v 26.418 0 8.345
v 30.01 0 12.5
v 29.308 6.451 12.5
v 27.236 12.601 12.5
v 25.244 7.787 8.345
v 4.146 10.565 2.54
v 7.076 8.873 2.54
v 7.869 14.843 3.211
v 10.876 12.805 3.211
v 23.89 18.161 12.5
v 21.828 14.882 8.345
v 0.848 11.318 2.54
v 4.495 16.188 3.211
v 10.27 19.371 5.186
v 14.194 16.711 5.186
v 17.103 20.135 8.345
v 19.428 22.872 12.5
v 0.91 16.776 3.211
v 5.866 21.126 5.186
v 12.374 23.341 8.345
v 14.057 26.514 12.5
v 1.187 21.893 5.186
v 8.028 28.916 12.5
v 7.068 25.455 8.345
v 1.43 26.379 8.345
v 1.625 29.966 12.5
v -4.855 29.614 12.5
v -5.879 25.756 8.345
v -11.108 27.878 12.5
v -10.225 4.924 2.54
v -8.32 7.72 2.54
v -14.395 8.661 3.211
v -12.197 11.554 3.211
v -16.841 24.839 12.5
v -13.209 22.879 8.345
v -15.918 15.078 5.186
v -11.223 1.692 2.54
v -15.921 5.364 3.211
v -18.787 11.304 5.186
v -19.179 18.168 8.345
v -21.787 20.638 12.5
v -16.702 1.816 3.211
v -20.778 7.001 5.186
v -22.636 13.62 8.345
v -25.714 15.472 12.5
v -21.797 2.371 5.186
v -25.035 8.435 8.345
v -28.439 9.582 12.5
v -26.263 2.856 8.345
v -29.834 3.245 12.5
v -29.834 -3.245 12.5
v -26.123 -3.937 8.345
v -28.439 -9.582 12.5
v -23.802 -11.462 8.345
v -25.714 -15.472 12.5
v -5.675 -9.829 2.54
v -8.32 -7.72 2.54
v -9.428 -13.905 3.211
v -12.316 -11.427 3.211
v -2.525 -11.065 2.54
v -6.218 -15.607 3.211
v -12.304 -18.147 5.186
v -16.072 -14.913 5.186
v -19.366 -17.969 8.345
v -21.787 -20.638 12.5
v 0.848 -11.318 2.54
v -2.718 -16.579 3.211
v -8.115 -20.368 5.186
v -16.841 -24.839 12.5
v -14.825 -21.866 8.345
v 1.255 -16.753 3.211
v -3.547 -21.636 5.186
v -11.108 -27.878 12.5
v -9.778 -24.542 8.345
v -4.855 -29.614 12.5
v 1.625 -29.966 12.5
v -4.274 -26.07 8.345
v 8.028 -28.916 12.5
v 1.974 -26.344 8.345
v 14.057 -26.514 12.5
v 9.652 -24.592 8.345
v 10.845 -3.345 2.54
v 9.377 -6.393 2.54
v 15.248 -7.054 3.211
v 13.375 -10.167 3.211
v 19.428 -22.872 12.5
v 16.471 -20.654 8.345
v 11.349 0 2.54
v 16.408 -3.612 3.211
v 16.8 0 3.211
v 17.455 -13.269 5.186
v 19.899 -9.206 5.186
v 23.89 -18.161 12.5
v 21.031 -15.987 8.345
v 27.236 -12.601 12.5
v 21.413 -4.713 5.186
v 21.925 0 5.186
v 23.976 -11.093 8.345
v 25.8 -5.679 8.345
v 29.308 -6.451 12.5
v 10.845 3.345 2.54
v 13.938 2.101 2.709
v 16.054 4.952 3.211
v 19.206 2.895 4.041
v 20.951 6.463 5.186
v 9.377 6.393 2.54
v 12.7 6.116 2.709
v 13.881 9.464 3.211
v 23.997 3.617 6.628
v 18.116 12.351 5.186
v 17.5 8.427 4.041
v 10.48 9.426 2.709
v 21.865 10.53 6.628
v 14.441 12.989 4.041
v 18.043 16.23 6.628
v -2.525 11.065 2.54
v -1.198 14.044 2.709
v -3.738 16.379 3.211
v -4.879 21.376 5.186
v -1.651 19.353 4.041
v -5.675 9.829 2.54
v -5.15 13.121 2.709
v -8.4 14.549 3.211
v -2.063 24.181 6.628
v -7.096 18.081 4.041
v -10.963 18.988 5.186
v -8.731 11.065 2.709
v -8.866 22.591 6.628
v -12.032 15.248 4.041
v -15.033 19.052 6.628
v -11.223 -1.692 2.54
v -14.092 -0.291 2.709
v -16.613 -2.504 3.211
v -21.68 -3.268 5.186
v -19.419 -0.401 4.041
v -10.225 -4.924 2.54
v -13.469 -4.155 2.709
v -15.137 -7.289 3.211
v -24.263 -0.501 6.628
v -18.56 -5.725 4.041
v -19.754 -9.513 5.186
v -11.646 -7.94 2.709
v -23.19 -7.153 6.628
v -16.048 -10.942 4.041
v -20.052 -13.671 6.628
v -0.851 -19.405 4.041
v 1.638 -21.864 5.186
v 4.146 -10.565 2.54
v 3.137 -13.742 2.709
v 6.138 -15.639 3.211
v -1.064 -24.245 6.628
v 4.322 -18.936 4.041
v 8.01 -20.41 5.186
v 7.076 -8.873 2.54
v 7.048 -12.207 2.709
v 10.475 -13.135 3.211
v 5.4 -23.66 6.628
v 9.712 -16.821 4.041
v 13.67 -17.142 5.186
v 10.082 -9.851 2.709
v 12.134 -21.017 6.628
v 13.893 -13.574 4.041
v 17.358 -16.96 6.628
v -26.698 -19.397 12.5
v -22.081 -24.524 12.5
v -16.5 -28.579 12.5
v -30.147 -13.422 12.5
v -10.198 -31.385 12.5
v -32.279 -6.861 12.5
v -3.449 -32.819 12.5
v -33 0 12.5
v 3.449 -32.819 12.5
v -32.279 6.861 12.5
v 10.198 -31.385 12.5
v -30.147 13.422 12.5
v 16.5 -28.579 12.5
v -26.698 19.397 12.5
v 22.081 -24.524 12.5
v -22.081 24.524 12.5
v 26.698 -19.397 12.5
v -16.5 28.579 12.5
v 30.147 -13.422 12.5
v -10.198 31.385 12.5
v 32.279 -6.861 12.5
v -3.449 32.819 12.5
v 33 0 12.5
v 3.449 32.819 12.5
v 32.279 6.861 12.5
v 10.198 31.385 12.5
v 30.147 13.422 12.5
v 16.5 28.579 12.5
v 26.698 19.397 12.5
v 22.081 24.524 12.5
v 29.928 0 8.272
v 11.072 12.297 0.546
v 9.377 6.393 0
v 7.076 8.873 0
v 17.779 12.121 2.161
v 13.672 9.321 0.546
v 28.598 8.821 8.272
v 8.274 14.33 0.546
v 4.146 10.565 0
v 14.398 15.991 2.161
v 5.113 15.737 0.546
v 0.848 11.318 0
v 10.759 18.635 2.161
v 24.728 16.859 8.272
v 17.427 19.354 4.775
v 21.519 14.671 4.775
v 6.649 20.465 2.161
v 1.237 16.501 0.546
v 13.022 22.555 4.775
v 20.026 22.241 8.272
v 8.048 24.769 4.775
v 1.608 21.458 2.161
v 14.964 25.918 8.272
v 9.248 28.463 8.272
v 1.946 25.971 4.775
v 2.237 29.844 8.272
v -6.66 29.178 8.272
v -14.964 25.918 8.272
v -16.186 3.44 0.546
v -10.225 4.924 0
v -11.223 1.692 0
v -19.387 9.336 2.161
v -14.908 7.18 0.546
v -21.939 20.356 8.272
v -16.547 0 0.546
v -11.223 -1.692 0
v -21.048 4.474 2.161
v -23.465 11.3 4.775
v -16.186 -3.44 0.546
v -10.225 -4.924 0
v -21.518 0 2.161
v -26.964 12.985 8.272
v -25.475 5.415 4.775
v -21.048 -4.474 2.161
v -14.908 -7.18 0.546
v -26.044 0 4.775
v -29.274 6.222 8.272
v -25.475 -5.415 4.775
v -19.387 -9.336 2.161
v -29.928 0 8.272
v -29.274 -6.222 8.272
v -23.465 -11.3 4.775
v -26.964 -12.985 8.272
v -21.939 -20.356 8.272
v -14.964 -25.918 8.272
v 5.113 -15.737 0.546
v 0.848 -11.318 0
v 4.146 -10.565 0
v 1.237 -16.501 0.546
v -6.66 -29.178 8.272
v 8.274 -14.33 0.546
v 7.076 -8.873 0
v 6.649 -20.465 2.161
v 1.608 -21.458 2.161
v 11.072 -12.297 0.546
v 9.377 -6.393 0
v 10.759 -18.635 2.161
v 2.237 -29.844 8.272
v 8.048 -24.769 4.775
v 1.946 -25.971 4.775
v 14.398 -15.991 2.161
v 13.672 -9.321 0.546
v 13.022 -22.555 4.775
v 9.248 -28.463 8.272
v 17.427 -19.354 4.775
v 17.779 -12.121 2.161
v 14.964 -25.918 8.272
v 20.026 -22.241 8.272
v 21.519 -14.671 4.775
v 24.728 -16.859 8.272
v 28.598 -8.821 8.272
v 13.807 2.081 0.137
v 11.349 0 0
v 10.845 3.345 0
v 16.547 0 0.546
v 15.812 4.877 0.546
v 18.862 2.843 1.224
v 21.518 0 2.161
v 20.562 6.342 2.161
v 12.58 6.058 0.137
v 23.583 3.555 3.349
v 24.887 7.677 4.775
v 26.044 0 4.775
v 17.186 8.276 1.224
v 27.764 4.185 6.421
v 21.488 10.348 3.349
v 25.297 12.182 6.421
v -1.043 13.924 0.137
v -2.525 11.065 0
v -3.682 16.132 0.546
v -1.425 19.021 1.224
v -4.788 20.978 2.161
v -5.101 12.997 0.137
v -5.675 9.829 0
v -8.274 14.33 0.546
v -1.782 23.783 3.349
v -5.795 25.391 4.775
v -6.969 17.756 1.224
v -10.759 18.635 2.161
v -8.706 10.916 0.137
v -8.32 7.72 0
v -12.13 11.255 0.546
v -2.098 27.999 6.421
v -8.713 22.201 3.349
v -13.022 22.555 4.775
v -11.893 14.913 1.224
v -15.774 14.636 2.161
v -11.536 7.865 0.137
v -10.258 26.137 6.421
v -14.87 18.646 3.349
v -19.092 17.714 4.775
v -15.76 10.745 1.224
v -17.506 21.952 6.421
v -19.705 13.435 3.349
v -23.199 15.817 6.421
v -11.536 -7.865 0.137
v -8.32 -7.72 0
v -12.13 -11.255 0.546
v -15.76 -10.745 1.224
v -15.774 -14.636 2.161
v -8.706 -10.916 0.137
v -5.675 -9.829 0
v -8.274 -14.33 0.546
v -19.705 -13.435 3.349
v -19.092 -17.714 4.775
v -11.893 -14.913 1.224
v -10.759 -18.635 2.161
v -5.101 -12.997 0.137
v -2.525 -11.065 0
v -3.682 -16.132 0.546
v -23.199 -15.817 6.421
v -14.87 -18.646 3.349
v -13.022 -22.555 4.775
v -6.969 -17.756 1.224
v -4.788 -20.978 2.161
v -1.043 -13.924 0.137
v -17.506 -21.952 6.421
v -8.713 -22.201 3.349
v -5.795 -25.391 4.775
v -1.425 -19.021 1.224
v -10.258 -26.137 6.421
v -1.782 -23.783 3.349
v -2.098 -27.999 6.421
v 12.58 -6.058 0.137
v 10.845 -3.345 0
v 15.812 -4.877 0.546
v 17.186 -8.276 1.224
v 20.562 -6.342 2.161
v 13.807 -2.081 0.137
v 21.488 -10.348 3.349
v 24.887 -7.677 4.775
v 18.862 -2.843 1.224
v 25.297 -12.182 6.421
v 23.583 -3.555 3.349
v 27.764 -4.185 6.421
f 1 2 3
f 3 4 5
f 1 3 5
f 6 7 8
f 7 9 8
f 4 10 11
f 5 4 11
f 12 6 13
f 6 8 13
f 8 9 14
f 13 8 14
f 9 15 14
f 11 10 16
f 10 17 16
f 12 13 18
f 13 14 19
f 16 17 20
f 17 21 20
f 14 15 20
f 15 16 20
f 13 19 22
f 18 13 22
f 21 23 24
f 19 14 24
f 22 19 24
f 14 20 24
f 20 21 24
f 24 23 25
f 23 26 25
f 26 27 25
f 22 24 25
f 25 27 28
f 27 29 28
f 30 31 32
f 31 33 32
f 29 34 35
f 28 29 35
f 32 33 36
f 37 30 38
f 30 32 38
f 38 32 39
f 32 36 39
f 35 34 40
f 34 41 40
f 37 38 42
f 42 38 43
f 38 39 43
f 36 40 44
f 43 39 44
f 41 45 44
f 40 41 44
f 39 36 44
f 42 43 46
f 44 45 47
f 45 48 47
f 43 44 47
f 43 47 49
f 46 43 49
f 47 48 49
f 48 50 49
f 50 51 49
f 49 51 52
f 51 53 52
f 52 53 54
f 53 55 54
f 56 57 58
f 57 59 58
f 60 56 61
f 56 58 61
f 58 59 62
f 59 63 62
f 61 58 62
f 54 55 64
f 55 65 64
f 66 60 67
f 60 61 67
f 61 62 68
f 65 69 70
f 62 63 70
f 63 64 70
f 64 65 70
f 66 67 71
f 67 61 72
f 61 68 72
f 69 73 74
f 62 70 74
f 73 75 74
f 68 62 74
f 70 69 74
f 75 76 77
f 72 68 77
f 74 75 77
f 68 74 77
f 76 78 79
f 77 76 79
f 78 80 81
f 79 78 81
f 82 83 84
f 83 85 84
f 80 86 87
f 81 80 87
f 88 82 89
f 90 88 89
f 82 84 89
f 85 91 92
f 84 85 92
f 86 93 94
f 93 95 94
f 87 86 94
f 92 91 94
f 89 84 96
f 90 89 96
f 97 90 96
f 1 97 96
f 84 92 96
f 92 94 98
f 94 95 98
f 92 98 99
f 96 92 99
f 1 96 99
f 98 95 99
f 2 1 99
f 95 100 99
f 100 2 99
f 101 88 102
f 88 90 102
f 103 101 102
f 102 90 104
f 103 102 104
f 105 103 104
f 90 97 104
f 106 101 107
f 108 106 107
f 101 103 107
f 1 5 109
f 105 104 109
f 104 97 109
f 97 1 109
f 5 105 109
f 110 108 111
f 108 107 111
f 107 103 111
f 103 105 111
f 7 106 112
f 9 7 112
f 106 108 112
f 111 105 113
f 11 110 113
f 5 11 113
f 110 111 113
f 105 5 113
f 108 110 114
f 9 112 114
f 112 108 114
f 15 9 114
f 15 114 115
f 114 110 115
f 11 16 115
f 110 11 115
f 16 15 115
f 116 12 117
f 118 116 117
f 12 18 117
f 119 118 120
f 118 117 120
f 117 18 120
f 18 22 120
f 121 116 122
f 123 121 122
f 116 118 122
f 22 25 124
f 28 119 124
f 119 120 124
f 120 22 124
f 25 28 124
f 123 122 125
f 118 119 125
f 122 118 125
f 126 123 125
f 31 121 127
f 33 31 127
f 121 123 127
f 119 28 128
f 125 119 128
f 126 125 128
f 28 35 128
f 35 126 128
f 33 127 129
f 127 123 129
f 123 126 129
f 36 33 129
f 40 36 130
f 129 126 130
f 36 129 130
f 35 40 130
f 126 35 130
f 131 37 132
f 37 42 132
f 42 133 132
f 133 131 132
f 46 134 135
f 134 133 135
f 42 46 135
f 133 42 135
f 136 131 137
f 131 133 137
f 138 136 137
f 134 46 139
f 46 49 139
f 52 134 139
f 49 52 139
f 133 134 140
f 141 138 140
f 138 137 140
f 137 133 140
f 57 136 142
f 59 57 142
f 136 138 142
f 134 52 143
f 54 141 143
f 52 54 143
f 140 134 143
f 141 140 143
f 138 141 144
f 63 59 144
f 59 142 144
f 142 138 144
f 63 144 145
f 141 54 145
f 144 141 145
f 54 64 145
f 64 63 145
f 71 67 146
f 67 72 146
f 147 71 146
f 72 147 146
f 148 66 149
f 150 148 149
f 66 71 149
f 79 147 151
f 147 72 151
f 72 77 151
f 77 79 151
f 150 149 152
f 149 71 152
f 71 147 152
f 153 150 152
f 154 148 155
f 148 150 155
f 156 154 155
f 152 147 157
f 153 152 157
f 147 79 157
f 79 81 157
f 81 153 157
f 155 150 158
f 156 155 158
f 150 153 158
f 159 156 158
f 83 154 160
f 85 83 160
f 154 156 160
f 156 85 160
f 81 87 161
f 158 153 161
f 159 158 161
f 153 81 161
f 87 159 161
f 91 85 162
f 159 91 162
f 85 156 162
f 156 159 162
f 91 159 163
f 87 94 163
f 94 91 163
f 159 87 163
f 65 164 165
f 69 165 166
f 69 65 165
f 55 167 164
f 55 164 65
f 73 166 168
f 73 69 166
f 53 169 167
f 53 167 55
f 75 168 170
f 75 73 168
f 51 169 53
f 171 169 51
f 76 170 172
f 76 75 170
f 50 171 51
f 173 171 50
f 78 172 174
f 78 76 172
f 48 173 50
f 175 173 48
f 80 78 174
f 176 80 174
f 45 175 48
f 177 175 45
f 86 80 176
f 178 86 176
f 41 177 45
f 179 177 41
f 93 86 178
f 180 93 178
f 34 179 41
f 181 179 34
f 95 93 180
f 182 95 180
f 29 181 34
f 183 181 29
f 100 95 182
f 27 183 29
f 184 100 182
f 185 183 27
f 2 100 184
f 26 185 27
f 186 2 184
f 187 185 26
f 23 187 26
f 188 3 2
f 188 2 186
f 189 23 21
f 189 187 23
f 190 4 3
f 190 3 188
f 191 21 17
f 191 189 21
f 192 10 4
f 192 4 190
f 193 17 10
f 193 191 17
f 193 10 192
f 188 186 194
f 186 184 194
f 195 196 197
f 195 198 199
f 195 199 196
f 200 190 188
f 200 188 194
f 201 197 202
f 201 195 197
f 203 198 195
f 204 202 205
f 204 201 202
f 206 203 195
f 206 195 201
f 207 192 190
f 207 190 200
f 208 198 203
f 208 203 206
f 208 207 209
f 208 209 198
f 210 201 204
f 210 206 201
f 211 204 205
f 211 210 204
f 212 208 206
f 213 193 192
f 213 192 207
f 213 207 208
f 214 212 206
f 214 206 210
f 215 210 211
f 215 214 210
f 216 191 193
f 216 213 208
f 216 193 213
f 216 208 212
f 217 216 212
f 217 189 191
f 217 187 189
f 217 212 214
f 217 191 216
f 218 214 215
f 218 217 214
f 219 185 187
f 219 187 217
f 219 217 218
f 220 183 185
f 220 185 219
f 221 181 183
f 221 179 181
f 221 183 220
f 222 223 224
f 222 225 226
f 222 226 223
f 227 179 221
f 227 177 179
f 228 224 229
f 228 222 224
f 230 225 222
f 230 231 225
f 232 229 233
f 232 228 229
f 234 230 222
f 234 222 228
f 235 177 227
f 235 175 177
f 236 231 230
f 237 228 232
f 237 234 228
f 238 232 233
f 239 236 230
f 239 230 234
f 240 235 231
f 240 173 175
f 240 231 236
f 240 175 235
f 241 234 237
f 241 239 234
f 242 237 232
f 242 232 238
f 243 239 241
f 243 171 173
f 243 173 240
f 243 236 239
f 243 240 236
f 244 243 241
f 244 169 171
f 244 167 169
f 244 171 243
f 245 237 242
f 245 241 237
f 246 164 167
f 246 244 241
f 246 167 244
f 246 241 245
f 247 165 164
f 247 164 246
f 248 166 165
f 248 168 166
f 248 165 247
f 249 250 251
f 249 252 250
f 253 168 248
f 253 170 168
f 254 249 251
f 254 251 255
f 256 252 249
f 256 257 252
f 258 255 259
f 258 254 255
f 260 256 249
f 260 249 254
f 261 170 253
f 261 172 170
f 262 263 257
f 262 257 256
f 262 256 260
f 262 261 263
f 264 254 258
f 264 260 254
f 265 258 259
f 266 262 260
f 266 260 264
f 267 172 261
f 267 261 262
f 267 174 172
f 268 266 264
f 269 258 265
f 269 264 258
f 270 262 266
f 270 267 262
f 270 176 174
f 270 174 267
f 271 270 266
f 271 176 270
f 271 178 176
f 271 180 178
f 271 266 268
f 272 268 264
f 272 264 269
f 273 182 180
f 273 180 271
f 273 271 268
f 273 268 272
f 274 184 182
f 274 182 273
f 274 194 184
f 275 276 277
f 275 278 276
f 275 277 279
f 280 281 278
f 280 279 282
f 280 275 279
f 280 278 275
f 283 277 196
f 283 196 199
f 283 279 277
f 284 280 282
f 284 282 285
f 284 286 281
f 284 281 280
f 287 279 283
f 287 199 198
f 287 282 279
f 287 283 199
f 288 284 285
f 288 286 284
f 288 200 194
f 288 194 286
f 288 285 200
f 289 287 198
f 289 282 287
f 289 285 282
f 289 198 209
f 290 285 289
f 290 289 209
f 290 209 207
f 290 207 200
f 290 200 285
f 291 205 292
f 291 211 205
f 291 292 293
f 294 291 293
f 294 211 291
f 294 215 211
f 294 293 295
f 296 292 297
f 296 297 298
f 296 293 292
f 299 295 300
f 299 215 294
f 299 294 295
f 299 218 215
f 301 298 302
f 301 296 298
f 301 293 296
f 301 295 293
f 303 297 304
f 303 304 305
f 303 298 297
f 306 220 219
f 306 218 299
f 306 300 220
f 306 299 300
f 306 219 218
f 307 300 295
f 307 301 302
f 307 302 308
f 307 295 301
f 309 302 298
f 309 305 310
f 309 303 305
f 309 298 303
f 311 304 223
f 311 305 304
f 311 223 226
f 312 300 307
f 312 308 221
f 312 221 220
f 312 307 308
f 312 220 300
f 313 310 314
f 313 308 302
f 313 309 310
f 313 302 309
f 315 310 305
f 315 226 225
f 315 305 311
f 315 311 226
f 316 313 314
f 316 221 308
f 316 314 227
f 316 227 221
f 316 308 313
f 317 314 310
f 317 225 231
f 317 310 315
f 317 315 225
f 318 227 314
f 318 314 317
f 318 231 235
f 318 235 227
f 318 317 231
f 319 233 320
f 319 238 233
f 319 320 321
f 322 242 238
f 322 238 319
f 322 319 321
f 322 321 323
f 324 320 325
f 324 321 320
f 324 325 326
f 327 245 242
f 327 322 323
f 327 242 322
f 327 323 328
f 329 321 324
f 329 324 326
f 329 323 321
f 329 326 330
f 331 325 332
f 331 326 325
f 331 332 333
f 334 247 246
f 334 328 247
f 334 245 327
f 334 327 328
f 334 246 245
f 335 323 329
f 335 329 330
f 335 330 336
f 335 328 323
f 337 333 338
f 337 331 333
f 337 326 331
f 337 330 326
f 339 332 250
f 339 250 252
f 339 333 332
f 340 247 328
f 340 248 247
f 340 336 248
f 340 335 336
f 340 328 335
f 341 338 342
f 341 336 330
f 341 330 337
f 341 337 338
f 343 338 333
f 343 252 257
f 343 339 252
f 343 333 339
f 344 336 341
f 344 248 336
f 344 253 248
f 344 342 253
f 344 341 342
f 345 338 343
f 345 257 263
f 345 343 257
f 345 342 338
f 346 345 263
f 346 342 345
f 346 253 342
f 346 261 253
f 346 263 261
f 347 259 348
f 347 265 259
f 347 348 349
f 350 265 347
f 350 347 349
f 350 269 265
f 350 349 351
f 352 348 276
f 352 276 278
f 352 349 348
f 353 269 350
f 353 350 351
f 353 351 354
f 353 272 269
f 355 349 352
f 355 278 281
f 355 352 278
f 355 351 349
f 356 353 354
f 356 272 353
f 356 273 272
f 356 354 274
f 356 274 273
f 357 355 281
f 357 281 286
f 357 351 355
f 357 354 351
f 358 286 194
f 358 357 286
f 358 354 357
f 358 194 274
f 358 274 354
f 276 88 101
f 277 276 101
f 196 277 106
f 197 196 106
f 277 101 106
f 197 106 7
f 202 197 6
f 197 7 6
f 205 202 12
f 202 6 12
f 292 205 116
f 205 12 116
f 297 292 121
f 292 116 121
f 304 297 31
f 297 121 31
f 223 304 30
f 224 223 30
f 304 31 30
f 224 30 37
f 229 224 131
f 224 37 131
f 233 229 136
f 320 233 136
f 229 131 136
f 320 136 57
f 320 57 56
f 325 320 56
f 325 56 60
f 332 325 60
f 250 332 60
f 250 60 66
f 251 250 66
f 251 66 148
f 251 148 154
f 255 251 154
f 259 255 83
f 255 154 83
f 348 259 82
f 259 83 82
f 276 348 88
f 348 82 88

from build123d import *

# Parameters (mm, degrees)
SKETCH1_R           = 33
BOSS_EXTRUDE1_DEPTH = 12.5
FILLET1_R           = 25


# Read off the part's stored shape, not the designer's step: Shell1
with BuildPart() as part:
    # Sketch1 → Boss-Extrude1 (new body)
    with BuildSketch(Plane.XY):
        Circle(SKETCH1_R)
    extrude(amount=BOSS_EXTRUDE1_DEPTH)

    # Fillet1
    # the kernel refuses this fillet: 25 mm, written as the material it takes off along each edge
    with BuildSketch(Plane(origin=(0, 0, 0), x_dir=(1, 0, 0), z_dir=(0, -1, 0))) as fillet1_piece_1:
        with BuildLine():
            CenterArc((11.349364905, 25), FILLET1_R, 270, 60)
            Line((11.349364905, 0), (11.349364905, -0.5))
            Line((11.349364905, -0.5), (33, -0.5))
            Line((33, -0.5), (33.5, 0))
            ThreePointArc((33.5, 0), (33.5, 6.25), (33.433012702, 12.25))
            Line((33.433012702, 12.25), (33, 12.5))
        make_face()
    revolve(axis=Axis((0, 0, 0), (0, 0, 1)), mode=Mode.SUBTRACT)

    # Shell1 outline → Shell1 (revolve, cut)
    with BuildSketch(Plane.XZ):
        with BuildLine():
            Line((0, 0), (11.349364905, 0))
            Line((11.349364905, 0), (11.349364905, 2.54))
            ThreePointArc((11.349364905, 2.54), (21.925318763, 5.185843445), (30.009525676, 12.5))
            Line((30.009525676, 12.5), (0, 12.5))
            Line((0, 12.5), (0, 0))
        make_face()
    revolve(axis=Axis((0, 0, 0), (0, 0, 1)), mode=Mode.SUBTRACT)


solid = part.part
